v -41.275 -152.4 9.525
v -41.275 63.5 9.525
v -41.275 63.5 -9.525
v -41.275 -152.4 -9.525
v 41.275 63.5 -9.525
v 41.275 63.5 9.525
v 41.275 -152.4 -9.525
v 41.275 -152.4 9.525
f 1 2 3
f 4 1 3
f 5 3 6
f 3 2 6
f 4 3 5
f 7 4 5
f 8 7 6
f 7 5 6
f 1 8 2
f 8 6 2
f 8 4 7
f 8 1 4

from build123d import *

# Parameters (mm, degrees)
F1_DEPTH = 63.5
F2_DEPTH = 25.4
F3_DEPTH = 63.5


with BuildPart() as f1:
    # F0 (on Front) → F1 (new body, symmetric)
    with BuildSketch(Plane.XZ):
        Polygon((-41.275, -9.525), (41.275, -9.525), (41.275, 9.525), (22.225, 9.525), (-41.275, 9.525), align=None)
    extrude(amount=F1_DEPTH, both=True)

    # F2 (add): a face of the model
    f2_faces = [f1.faces().sort_by_distance(p)[0] for p in [
        (0, -63.5, 0),
    ]]
    extrude(f2_faces, amount=F2_DEPTH)

    # F3 (add, symmetric): a face of the model
    f3_faces = [f1.faces().sort_by_distance(p)[0] for p in [
        (0, -88.9, 0),
    ]]
    extrude(f3_faces, amount=F3_DEPTH, both=True)


solid = f1.part
